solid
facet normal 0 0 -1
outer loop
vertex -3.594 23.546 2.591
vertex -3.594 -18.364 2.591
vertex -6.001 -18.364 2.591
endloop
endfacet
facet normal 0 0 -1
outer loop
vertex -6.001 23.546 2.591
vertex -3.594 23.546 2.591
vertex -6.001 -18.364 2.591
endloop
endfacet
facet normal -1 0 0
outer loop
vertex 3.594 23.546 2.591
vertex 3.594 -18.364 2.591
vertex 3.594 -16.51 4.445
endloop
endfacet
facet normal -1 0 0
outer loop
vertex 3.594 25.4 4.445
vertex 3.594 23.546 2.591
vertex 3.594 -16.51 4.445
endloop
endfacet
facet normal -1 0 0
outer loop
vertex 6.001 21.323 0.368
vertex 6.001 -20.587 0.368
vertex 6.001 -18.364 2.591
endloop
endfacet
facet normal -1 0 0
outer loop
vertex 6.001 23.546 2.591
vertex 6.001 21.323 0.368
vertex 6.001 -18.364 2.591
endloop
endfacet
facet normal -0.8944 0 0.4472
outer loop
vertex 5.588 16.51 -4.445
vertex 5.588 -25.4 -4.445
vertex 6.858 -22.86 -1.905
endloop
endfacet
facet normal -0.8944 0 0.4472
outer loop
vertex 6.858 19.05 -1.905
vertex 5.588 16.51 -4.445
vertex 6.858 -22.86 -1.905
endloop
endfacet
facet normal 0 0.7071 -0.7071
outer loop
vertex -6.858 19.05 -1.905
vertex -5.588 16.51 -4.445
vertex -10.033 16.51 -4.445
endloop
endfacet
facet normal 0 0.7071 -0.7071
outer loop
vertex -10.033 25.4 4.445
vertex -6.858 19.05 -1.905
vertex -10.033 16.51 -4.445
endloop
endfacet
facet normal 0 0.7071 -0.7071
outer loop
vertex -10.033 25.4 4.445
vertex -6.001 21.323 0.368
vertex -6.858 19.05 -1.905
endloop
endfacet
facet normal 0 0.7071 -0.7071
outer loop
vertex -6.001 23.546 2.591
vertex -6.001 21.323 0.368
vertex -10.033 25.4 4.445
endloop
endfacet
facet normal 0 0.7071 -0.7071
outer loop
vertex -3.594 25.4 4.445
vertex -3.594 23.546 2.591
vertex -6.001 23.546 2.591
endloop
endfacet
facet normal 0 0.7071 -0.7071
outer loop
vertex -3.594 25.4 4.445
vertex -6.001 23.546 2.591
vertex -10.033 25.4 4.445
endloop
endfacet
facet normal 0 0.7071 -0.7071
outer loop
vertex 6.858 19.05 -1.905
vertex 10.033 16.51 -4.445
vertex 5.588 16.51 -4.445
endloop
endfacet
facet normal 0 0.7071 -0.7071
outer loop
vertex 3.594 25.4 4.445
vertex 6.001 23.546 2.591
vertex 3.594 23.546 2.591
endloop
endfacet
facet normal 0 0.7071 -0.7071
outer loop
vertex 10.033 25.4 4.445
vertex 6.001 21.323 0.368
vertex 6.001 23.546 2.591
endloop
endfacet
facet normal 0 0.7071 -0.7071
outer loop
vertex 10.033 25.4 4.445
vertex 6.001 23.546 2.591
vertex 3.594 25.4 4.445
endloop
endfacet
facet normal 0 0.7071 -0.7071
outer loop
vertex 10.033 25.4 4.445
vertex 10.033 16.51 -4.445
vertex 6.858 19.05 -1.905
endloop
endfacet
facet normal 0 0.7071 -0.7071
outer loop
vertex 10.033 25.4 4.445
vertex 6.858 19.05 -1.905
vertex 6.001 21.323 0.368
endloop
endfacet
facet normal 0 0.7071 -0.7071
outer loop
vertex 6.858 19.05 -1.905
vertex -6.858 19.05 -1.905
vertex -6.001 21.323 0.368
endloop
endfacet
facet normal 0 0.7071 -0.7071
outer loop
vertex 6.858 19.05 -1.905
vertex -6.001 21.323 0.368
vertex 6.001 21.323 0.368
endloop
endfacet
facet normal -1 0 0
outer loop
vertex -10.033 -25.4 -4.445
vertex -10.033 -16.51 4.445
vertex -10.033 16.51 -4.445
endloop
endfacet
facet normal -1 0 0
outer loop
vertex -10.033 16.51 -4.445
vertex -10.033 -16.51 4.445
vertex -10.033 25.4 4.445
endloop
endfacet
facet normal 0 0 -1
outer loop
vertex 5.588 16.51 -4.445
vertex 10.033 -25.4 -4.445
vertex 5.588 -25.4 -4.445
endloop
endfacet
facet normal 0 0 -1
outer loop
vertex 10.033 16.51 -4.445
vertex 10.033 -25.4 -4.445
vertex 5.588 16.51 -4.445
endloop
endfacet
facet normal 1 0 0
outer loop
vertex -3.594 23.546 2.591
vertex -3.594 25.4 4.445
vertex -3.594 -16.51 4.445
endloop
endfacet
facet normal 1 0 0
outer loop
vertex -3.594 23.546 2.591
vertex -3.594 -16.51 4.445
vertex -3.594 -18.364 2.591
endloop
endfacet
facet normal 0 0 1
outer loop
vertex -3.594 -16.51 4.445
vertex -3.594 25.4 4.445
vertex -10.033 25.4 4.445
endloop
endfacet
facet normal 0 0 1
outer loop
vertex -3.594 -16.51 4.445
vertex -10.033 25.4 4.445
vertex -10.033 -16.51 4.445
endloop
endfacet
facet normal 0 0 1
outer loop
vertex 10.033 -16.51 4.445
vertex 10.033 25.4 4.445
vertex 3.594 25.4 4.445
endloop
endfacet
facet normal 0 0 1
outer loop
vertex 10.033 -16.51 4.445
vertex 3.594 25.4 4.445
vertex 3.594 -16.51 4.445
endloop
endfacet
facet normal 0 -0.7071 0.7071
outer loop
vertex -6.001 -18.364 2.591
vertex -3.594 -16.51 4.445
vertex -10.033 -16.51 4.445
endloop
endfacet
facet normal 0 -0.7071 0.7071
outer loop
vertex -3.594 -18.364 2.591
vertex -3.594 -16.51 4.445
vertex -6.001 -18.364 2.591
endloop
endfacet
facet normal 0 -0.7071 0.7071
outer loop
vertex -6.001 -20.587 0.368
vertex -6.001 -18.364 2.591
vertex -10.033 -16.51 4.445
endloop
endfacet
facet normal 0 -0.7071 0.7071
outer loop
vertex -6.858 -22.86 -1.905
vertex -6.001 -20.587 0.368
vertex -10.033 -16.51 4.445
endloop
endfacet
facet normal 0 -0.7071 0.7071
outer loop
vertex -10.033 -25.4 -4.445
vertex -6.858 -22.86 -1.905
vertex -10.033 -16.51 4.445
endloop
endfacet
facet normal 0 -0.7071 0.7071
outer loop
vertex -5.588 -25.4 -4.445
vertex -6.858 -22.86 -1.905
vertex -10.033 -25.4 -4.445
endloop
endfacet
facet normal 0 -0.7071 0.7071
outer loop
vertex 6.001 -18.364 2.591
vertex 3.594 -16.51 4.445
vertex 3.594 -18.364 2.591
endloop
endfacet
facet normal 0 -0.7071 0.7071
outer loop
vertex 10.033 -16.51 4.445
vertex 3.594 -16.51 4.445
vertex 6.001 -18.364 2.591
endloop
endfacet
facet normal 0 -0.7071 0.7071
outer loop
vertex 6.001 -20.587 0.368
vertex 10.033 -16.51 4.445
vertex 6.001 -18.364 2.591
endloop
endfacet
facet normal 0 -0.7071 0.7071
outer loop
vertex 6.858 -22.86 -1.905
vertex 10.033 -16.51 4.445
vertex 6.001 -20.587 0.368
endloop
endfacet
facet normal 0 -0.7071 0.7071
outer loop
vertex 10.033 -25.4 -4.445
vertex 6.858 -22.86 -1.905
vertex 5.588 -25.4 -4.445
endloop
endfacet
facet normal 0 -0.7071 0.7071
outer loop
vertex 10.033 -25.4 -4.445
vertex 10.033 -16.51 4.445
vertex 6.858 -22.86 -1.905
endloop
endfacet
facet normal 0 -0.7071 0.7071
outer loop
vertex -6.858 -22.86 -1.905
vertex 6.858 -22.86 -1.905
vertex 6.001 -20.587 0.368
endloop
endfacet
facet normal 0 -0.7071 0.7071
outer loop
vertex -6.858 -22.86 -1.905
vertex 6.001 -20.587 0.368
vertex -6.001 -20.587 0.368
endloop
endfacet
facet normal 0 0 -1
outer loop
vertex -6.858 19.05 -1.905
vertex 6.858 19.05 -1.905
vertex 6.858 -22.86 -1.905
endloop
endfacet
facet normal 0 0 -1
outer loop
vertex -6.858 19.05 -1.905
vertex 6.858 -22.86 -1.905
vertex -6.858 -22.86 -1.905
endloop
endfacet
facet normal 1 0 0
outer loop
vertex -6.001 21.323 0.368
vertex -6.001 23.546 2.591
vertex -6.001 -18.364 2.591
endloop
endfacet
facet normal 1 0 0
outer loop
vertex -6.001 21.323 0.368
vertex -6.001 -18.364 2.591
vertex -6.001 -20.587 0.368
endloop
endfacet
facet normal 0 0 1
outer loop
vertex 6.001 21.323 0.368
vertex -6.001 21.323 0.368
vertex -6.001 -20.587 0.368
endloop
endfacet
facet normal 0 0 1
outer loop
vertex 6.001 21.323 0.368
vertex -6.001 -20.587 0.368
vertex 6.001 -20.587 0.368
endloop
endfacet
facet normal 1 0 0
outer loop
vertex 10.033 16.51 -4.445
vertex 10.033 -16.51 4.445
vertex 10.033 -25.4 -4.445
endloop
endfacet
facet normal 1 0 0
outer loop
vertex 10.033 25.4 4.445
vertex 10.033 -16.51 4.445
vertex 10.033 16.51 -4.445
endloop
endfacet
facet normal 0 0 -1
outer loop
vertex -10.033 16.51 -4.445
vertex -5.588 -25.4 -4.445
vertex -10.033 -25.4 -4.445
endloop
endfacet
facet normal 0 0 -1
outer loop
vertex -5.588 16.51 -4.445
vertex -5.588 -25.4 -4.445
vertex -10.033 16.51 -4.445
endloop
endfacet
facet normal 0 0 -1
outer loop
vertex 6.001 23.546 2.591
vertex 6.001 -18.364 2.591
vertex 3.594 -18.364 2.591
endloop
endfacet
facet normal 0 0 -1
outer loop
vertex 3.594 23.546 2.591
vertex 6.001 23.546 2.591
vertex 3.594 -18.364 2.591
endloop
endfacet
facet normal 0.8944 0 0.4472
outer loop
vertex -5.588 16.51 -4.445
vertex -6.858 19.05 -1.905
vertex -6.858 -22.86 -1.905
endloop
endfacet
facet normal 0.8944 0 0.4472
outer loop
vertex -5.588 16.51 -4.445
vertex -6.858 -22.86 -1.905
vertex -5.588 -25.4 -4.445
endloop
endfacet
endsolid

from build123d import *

# Parameters (mm, degrees)
F1_DEPTH = 10.033
F3_DEPTH = 76.2
F5_DEPTH = 76.2


with BuildPart() as f1:
    # F0 (on Right) → F1 (new body, symmetric)
    with BuildSketch(Plane.YZ):
        Polygon((16.51, -4.445), (25.4, 4.445), (-16.51, 4.445), (-25.4, -4.445), align=None)
    extrude(amount=F1_DEPTH, both=True)

    # F2 (on Front) → F3 (cut, symmetric)
    with BuildSketch(Plane.XZ):
        Polygon((3.5941, 7.676974), (-3.5941, 7.676974), (-3.5941, 2.5908), (-6.00075, 2.5908), (-6.00075, 0.3683), (6.00075, 0.3683), (6.00075, 2.5908), (3.5941, 2.5908), align=None)
    extrude(amount=F3_DEPTH, both=True, mode=Mode.SUBTRACT)

    # F4 (on Front) → F5 (cut, symmetric)
    with BuildSketch(Plane.XZ):
        Polygon((-6.858, -1.905), (-5.588, -4.445), (5.588, -4.445), (6.858, -1.905), align=None)
    extrude(amount=F5_DEPTH, both=True, mode=Mode.SUBTRACT)


solid = f1.part
